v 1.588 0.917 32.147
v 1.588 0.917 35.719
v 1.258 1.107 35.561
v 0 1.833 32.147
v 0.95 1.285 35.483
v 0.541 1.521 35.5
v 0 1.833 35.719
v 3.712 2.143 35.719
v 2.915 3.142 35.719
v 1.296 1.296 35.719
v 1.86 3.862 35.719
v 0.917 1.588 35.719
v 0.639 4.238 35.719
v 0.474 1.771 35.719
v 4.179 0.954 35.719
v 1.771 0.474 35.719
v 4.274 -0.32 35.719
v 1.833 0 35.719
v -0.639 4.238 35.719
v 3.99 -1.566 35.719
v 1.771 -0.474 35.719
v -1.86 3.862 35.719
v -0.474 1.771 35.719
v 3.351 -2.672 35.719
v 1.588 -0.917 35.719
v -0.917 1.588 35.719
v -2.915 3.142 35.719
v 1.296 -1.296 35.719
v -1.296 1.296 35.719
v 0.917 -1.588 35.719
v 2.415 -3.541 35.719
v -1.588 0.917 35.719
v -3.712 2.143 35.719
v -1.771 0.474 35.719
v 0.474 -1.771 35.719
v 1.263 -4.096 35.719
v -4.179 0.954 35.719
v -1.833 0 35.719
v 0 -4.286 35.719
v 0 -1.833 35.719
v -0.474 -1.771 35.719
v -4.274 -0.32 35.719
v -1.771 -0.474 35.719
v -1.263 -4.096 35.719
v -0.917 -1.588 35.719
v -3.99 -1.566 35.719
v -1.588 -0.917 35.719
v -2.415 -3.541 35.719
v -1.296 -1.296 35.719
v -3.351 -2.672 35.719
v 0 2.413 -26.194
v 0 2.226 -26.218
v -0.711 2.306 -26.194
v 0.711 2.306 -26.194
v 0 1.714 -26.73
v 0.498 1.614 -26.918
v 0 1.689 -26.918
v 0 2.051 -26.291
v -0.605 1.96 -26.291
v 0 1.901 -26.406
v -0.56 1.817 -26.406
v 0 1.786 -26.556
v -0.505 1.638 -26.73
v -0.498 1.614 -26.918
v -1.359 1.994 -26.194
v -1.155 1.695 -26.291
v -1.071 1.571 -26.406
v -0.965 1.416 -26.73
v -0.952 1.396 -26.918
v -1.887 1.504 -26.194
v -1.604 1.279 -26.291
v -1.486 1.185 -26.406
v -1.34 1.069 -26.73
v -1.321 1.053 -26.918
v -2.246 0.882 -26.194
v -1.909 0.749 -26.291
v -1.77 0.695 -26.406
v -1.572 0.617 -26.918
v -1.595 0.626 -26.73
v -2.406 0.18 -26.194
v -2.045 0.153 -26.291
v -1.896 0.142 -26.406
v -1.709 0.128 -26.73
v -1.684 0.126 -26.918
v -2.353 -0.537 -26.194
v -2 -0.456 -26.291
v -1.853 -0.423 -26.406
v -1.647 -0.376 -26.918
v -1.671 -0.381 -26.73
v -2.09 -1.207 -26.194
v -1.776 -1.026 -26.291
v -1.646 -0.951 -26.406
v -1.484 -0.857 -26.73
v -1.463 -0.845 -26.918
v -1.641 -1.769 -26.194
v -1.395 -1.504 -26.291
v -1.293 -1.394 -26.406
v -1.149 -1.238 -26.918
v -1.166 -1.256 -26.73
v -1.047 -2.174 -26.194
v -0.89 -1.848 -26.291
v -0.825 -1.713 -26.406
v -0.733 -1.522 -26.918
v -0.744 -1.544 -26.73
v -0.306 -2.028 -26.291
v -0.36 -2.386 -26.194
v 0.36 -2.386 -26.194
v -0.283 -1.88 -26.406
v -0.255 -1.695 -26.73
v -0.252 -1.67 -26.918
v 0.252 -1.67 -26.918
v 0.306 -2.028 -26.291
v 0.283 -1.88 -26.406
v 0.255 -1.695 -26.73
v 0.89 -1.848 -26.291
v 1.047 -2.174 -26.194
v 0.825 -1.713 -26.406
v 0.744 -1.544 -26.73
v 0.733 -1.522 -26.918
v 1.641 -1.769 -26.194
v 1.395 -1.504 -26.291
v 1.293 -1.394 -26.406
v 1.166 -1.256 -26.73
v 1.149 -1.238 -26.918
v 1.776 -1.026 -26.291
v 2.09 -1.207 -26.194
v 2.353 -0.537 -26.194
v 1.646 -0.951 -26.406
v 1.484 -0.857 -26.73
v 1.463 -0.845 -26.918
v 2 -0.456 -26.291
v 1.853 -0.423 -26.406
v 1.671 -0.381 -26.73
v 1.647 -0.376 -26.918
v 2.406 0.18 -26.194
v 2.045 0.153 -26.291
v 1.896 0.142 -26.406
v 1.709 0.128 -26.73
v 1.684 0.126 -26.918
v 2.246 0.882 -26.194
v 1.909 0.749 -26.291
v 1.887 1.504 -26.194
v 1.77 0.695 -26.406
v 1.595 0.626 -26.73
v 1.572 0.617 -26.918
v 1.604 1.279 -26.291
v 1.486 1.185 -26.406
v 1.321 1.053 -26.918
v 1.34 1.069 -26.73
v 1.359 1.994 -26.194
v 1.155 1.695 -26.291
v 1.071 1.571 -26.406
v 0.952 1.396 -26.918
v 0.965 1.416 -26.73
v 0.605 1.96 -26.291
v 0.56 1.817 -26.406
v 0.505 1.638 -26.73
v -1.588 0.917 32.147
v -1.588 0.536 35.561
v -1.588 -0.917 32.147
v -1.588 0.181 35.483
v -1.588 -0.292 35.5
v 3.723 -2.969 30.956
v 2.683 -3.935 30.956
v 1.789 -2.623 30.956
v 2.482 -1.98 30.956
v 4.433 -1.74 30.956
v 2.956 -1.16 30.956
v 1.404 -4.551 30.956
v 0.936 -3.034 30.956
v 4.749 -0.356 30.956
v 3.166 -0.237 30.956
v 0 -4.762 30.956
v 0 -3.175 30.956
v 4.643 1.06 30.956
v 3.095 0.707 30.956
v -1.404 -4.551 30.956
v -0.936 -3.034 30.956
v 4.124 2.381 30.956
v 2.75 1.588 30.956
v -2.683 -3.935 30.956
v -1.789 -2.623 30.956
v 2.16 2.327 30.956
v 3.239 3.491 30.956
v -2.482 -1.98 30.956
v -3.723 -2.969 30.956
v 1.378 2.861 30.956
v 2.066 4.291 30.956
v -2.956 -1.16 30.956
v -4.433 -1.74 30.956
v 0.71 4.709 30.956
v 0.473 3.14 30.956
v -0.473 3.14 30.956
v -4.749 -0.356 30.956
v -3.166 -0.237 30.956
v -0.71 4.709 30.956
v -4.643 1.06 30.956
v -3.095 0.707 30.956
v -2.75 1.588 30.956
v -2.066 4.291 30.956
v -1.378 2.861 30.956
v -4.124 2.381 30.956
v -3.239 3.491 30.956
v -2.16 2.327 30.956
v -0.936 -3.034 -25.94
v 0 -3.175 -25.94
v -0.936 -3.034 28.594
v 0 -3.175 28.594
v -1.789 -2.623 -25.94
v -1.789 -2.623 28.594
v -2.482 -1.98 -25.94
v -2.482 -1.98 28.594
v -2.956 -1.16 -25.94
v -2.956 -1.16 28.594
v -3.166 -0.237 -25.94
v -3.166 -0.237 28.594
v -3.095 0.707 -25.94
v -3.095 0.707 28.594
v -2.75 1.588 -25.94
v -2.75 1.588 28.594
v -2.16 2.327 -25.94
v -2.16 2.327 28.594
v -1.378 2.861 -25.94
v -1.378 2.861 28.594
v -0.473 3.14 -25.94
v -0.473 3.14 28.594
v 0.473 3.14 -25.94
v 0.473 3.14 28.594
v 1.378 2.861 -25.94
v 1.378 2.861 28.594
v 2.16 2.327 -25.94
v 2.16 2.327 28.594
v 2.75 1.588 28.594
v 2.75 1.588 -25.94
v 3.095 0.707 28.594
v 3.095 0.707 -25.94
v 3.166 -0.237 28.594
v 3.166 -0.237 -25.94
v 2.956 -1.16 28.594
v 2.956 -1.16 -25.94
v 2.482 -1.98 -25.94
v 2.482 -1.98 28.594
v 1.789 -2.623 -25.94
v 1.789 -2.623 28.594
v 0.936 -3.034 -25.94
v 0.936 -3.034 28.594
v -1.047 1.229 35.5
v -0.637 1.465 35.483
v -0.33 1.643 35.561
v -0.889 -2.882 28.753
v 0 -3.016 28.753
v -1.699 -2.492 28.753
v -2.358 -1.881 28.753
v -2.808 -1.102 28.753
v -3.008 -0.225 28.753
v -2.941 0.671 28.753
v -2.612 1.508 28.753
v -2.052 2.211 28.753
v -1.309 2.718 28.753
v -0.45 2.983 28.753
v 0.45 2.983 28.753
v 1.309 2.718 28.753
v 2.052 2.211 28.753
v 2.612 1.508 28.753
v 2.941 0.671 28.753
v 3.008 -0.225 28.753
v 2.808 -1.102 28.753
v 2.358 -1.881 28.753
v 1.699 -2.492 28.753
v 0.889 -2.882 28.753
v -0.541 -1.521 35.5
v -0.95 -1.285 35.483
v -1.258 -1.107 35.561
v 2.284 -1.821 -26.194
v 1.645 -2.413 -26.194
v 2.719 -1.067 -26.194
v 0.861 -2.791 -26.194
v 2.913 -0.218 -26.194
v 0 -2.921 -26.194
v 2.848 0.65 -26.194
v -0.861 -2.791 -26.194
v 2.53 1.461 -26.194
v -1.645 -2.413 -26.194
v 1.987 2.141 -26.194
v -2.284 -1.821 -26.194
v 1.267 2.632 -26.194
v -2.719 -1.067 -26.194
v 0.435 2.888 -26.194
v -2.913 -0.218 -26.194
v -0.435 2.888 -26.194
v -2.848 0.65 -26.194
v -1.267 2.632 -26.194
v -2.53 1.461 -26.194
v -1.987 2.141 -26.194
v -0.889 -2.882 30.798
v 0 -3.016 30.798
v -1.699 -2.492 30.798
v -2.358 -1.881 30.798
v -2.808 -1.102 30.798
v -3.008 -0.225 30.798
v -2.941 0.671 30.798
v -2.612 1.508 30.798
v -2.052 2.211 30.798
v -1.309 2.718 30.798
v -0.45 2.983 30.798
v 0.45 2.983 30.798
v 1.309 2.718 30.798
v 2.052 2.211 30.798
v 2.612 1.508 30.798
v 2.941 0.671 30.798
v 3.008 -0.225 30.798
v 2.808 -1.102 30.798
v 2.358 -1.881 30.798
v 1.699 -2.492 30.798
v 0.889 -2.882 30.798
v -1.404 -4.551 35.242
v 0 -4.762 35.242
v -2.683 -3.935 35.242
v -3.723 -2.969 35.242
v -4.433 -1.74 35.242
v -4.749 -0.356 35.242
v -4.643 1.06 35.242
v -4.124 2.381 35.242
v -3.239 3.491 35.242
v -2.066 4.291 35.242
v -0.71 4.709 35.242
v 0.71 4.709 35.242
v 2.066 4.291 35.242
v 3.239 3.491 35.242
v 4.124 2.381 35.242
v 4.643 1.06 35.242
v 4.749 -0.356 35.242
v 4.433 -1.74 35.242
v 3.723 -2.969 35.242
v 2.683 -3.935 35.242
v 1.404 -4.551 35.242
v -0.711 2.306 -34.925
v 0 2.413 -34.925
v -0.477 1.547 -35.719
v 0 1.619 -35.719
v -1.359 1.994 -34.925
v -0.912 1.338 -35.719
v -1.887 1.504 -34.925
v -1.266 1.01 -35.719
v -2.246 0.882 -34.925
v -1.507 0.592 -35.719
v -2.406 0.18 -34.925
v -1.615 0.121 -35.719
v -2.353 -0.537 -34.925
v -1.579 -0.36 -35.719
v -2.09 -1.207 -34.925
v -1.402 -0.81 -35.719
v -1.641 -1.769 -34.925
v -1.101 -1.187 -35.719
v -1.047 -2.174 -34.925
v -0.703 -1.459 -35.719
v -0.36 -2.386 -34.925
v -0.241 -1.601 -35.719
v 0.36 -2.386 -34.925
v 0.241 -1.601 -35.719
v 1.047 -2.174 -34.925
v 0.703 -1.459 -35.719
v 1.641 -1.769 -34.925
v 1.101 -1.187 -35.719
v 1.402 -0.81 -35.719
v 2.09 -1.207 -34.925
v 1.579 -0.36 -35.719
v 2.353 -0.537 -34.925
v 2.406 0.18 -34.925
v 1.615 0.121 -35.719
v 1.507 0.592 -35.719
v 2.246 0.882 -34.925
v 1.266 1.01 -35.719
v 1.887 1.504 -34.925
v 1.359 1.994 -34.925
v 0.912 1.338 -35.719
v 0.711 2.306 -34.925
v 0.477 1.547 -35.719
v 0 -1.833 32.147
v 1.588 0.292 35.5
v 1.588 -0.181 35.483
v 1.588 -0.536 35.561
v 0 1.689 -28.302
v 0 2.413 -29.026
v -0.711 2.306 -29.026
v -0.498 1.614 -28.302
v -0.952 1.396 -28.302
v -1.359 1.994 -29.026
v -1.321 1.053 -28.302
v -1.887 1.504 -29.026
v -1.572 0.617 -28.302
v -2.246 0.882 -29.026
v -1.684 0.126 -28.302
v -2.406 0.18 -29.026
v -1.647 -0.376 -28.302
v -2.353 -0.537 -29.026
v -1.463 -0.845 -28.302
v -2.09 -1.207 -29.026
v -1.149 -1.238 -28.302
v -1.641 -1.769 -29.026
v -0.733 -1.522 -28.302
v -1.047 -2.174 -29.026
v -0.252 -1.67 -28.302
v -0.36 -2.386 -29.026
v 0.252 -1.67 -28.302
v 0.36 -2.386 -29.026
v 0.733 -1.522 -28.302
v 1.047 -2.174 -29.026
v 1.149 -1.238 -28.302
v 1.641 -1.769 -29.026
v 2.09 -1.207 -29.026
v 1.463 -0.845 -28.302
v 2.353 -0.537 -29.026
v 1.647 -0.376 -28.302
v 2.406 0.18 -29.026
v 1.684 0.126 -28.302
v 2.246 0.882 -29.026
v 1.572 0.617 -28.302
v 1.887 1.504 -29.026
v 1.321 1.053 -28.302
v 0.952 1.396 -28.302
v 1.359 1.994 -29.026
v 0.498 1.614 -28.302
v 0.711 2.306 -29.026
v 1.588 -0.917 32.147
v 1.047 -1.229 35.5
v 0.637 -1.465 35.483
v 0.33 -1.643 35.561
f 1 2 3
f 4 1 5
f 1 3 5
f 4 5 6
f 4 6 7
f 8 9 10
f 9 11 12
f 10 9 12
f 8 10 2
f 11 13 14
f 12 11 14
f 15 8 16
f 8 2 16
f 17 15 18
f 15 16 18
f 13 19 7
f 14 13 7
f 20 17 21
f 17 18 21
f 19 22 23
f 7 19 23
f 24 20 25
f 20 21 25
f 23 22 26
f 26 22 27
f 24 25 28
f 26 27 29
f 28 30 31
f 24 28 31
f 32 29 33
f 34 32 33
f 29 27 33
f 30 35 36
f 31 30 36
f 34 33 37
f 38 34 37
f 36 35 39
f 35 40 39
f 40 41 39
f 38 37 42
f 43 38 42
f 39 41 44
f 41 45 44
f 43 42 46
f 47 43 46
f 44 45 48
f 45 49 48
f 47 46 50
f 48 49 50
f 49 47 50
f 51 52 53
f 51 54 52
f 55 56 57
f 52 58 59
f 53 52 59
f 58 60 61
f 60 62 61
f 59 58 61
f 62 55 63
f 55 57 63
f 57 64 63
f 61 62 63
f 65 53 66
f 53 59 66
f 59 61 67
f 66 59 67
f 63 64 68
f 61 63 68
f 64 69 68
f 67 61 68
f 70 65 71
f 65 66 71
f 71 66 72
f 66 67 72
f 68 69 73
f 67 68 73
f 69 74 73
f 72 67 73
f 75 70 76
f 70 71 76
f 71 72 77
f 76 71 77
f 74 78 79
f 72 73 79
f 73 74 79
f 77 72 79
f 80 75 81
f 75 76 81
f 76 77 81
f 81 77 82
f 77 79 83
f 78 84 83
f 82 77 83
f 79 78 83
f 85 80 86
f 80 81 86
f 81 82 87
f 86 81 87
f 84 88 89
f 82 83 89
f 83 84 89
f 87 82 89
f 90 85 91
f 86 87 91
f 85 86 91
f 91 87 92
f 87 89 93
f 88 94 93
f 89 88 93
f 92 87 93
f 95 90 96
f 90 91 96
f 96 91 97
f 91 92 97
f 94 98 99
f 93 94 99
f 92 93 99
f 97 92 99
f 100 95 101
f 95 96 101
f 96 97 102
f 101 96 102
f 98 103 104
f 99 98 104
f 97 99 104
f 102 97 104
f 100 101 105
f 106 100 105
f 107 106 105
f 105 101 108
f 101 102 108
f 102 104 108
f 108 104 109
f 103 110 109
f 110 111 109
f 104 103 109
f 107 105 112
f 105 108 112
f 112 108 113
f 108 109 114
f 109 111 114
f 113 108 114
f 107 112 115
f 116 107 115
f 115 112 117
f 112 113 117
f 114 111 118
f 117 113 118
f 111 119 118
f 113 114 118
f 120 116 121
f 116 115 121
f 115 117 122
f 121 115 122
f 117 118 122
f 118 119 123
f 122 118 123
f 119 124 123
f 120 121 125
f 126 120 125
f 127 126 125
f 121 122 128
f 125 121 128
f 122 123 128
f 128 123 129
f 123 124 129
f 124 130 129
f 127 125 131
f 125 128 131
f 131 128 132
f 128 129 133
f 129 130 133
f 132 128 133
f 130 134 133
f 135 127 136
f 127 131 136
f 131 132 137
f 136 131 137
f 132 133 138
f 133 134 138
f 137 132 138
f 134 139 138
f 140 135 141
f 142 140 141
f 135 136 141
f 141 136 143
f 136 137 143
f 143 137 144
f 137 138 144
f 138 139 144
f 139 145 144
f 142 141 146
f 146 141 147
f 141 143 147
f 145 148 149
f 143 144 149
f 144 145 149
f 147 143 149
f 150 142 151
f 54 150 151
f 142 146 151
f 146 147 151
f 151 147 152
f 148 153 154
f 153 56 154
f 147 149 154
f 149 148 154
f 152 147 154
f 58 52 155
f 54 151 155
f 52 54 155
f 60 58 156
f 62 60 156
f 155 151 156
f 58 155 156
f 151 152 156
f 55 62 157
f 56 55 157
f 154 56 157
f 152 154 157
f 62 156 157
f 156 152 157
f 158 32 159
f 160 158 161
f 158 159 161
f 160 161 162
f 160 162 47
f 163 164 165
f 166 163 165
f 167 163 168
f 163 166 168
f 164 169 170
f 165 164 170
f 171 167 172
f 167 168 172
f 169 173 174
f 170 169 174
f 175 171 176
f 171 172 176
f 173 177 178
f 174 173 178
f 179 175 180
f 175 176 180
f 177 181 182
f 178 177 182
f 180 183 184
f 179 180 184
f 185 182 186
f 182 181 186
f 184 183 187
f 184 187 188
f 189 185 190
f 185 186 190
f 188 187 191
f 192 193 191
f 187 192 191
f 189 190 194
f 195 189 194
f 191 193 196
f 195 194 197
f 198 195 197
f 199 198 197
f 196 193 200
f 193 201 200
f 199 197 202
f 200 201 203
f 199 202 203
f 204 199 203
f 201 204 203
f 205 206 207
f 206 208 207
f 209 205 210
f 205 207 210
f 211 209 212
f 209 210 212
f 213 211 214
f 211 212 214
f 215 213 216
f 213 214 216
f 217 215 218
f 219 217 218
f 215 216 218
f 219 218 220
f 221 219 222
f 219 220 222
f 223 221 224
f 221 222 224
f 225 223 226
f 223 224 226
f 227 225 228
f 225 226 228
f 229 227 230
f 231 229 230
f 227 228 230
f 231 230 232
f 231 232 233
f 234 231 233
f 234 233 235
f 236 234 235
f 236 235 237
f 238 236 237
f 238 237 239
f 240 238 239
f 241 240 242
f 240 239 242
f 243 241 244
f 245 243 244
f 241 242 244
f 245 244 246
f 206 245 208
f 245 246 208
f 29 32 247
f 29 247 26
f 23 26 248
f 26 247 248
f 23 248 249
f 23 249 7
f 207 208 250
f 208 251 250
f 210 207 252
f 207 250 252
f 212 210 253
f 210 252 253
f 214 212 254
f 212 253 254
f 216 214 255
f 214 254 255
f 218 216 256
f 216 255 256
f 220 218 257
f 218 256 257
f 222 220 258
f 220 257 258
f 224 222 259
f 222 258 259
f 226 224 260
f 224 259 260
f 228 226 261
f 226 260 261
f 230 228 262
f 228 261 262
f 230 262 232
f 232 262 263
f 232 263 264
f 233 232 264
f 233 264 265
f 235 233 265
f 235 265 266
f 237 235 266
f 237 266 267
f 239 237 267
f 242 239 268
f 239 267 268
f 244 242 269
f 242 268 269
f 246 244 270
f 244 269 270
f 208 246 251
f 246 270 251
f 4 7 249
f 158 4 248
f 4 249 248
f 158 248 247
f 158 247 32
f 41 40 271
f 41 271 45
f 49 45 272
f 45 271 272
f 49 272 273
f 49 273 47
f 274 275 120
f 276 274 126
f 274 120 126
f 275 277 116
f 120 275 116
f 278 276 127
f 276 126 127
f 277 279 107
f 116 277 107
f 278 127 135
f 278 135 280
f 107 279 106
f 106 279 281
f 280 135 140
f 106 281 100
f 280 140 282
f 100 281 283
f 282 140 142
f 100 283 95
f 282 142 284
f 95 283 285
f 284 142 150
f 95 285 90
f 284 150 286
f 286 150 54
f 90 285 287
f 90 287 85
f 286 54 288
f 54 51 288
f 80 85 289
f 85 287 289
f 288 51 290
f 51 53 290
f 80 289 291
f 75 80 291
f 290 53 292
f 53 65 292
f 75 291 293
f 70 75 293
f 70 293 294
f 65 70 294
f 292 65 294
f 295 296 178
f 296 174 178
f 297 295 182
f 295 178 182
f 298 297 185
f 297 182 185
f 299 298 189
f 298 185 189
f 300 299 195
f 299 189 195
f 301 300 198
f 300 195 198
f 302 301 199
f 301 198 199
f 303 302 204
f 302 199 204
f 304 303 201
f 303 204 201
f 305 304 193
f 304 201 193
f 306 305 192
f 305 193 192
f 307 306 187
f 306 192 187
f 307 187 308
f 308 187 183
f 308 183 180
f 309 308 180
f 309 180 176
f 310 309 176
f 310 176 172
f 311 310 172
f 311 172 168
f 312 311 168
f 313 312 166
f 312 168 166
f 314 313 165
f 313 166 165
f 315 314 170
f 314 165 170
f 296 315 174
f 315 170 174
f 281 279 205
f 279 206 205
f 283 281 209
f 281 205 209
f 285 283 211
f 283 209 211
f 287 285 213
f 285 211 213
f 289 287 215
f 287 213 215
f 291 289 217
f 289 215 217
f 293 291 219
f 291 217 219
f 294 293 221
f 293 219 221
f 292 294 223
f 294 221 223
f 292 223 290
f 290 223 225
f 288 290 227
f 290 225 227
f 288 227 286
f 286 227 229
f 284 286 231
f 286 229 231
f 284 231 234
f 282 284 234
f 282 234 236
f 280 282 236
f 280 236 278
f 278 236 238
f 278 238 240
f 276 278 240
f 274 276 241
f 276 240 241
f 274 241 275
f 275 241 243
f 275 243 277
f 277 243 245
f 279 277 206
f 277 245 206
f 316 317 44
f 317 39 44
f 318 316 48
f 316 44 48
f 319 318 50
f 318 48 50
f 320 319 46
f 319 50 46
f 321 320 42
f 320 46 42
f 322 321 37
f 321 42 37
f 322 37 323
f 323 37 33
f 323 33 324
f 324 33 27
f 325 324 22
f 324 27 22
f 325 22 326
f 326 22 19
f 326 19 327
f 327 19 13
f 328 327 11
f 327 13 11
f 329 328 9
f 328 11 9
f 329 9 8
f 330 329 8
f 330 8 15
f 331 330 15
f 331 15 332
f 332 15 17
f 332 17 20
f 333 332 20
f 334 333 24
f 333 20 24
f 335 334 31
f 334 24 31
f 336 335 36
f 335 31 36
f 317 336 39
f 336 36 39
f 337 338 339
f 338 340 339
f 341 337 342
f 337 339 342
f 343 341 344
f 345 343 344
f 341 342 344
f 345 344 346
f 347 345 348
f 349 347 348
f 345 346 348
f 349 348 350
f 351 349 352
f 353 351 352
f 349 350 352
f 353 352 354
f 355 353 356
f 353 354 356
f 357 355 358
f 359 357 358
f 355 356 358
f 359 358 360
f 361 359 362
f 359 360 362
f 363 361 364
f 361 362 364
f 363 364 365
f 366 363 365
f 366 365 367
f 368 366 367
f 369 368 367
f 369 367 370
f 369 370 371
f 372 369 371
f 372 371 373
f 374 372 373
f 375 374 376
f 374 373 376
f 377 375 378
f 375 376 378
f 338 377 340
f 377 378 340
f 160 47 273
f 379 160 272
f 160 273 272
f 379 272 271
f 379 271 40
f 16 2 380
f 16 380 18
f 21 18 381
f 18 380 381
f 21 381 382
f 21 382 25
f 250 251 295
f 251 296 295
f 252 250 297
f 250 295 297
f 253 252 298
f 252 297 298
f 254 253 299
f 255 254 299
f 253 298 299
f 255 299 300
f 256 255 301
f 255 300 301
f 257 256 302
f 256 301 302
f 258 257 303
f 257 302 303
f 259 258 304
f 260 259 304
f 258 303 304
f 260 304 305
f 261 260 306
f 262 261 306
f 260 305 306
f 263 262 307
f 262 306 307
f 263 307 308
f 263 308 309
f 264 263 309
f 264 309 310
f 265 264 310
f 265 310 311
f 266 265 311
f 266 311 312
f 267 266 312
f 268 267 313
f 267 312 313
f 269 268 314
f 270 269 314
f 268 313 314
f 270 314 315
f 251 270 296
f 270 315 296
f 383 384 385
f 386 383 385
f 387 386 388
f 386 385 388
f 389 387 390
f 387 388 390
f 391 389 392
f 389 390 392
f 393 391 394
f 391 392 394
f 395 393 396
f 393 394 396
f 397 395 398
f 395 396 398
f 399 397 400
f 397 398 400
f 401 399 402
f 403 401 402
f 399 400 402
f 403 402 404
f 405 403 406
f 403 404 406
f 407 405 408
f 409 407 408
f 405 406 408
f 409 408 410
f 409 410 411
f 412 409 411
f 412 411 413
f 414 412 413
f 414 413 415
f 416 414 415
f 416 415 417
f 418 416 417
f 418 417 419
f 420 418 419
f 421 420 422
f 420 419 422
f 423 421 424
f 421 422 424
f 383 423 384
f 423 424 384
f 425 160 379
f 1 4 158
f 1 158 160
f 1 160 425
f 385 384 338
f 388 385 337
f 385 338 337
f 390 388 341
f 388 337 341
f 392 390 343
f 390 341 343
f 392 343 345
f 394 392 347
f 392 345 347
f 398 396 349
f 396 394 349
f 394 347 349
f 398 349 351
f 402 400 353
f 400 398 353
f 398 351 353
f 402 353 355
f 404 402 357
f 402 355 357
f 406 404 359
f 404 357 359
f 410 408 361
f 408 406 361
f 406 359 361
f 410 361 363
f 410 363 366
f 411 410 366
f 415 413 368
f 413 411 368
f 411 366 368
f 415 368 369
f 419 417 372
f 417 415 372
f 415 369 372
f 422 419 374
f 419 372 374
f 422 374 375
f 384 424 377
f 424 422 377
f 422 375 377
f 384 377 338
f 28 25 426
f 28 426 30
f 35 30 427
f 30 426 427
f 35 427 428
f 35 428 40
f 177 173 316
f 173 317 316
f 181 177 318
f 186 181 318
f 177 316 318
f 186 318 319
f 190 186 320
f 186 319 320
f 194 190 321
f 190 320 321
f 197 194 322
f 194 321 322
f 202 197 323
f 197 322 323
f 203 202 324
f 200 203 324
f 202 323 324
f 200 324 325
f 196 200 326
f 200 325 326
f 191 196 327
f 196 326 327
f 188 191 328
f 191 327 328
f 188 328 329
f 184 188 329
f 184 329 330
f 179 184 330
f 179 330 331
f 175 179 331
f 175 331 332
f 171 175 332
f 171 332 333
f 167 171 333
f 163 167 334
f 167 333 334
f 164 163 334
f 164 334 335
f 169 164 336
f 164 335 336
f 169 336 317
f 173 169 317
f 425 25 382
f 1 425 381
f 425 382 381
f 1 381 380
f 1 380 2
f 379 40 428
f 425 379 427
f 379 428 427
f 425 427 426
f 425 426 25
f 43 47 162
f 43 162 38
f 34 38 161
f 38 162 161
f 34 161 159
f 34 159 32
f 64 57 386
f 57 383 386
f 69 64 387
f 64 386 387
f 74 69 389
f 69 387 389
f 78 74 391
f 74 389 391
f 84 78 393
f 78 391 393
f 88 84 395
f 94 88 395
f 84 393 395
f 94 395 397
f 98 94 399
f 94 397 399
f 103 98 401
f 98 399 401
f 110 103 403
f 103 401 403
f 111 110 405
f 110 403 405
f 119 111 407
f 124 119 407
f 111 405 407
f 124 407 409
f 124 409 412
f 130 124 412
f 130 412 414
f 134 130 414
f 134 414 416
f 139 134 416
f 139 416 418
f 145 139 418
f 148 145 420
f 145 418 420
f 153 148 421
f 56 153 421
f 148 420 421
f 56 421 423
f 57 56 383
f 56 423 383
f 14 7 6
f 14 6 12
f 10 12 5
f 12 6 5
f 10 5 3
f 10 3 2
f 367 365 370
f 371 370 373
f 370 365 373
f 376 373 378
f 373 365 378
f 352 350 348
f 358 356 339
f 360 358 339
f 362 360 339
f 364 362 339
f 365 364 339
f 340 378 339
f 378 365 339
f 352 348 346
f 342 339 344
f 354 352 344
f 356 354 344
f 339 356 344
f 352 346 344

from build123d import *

# Parameters (mm, degrees)
CUT_EXTRUDE1_DEPTH = 3.571875


with BuildPart() as part:
    # Sketch4 → Revolve1 (revolve)
    with BuildSketch(Plane(origin=(0, 0, 0), x_dir=(0, 0, -1), z_dir=(1, 0, 0))):
        Polygon((-30.95625, 4.7625), (-35.2425, 4.7625), (-35.71875, 4.28625), (-35.71875, 0), (26.19375, 0), (26.19375, 2.921), (25.93975, 3.175), (-28.59405, 3.175), (-28.7528, 3.01625), (-30.7975, 3.01625), (-30.95625, 3.175), align=None)
    revolve(axis=Axis((0, 0, 35.71875), (0, 0, -1)))

    # Sketch5 → Cut-Extrude1 (cut)
    with BuildSketch(Plane.XY.offset(35.71875)):
        Polygon((1.5875, 0.916543552), (0, 1.833087105), (-1.5875, 0.916543552), (-1.5875, -0.916543552), (0, -1.833087105), (1.5875, -0.916543552), align=None)
    extrude(amount=-CUT_EXTRUDE1_DEPTH, mode=Mode.SUBTRACT)

    # Cut-Extrude4 cone 1 section (through the dimple's axis) → Cut-Extrude4 (revolve, cut)
    with BuildSketch(Plane(origin=(0, 0, 35.71875), x_dir=(0, -1, 0), z_dir=(1, 0, 0))):
        Polygon((0, 0), (1.833087105, 0), (0, 1.833087105), align=None)
    revolve(axis=Axis((0, 0, 35.71875), (0, 0, -1)), mode=Mode.SUBTRACT)

    # Sketch7 → Revolve2 (revolve)
    with BuildSketch(Plane(origin=(0, 0, 0), x_dir=(0, 0, -1), z_dir=(1, 0, 0))):
        Polygon((26.19375, 2.413), (34.925, 2.413), (35.71875, 1.61925), (35.71875, 0), (26.19375, 0), align=None)
    revolve(axis=Axis((0, 0, -35.71875), (0, 0, 1)))

    # Sketch10 → Cut-Revolve1 (revolve, cut)
    with BuildSketch(Plane(origin=(0, 0, 0), x_dir=(0, 0, -1), z_dir=(1, 0, 0))):
        with BuildLine():
            Line((26.91765, 1.6891), (28.30195, 1.6891))
            Line((28.30195, 1.6891), (29.78785, 3.175))
            Line((29.78785, 3.175), (26.19375, 3.175))
            Line((26.19375, 3.175), (26.19375, 2.413))
            ThreePointArc((26.19375, 2.413), (26.405775401, 1.901125401), (26.91765, 1.6891))
        make_face()
    revolve(axis=Axis((0, 0, -35.71875), (0, 0, 1)), mode=Mode.SUBTRACT)


solid = part.part
